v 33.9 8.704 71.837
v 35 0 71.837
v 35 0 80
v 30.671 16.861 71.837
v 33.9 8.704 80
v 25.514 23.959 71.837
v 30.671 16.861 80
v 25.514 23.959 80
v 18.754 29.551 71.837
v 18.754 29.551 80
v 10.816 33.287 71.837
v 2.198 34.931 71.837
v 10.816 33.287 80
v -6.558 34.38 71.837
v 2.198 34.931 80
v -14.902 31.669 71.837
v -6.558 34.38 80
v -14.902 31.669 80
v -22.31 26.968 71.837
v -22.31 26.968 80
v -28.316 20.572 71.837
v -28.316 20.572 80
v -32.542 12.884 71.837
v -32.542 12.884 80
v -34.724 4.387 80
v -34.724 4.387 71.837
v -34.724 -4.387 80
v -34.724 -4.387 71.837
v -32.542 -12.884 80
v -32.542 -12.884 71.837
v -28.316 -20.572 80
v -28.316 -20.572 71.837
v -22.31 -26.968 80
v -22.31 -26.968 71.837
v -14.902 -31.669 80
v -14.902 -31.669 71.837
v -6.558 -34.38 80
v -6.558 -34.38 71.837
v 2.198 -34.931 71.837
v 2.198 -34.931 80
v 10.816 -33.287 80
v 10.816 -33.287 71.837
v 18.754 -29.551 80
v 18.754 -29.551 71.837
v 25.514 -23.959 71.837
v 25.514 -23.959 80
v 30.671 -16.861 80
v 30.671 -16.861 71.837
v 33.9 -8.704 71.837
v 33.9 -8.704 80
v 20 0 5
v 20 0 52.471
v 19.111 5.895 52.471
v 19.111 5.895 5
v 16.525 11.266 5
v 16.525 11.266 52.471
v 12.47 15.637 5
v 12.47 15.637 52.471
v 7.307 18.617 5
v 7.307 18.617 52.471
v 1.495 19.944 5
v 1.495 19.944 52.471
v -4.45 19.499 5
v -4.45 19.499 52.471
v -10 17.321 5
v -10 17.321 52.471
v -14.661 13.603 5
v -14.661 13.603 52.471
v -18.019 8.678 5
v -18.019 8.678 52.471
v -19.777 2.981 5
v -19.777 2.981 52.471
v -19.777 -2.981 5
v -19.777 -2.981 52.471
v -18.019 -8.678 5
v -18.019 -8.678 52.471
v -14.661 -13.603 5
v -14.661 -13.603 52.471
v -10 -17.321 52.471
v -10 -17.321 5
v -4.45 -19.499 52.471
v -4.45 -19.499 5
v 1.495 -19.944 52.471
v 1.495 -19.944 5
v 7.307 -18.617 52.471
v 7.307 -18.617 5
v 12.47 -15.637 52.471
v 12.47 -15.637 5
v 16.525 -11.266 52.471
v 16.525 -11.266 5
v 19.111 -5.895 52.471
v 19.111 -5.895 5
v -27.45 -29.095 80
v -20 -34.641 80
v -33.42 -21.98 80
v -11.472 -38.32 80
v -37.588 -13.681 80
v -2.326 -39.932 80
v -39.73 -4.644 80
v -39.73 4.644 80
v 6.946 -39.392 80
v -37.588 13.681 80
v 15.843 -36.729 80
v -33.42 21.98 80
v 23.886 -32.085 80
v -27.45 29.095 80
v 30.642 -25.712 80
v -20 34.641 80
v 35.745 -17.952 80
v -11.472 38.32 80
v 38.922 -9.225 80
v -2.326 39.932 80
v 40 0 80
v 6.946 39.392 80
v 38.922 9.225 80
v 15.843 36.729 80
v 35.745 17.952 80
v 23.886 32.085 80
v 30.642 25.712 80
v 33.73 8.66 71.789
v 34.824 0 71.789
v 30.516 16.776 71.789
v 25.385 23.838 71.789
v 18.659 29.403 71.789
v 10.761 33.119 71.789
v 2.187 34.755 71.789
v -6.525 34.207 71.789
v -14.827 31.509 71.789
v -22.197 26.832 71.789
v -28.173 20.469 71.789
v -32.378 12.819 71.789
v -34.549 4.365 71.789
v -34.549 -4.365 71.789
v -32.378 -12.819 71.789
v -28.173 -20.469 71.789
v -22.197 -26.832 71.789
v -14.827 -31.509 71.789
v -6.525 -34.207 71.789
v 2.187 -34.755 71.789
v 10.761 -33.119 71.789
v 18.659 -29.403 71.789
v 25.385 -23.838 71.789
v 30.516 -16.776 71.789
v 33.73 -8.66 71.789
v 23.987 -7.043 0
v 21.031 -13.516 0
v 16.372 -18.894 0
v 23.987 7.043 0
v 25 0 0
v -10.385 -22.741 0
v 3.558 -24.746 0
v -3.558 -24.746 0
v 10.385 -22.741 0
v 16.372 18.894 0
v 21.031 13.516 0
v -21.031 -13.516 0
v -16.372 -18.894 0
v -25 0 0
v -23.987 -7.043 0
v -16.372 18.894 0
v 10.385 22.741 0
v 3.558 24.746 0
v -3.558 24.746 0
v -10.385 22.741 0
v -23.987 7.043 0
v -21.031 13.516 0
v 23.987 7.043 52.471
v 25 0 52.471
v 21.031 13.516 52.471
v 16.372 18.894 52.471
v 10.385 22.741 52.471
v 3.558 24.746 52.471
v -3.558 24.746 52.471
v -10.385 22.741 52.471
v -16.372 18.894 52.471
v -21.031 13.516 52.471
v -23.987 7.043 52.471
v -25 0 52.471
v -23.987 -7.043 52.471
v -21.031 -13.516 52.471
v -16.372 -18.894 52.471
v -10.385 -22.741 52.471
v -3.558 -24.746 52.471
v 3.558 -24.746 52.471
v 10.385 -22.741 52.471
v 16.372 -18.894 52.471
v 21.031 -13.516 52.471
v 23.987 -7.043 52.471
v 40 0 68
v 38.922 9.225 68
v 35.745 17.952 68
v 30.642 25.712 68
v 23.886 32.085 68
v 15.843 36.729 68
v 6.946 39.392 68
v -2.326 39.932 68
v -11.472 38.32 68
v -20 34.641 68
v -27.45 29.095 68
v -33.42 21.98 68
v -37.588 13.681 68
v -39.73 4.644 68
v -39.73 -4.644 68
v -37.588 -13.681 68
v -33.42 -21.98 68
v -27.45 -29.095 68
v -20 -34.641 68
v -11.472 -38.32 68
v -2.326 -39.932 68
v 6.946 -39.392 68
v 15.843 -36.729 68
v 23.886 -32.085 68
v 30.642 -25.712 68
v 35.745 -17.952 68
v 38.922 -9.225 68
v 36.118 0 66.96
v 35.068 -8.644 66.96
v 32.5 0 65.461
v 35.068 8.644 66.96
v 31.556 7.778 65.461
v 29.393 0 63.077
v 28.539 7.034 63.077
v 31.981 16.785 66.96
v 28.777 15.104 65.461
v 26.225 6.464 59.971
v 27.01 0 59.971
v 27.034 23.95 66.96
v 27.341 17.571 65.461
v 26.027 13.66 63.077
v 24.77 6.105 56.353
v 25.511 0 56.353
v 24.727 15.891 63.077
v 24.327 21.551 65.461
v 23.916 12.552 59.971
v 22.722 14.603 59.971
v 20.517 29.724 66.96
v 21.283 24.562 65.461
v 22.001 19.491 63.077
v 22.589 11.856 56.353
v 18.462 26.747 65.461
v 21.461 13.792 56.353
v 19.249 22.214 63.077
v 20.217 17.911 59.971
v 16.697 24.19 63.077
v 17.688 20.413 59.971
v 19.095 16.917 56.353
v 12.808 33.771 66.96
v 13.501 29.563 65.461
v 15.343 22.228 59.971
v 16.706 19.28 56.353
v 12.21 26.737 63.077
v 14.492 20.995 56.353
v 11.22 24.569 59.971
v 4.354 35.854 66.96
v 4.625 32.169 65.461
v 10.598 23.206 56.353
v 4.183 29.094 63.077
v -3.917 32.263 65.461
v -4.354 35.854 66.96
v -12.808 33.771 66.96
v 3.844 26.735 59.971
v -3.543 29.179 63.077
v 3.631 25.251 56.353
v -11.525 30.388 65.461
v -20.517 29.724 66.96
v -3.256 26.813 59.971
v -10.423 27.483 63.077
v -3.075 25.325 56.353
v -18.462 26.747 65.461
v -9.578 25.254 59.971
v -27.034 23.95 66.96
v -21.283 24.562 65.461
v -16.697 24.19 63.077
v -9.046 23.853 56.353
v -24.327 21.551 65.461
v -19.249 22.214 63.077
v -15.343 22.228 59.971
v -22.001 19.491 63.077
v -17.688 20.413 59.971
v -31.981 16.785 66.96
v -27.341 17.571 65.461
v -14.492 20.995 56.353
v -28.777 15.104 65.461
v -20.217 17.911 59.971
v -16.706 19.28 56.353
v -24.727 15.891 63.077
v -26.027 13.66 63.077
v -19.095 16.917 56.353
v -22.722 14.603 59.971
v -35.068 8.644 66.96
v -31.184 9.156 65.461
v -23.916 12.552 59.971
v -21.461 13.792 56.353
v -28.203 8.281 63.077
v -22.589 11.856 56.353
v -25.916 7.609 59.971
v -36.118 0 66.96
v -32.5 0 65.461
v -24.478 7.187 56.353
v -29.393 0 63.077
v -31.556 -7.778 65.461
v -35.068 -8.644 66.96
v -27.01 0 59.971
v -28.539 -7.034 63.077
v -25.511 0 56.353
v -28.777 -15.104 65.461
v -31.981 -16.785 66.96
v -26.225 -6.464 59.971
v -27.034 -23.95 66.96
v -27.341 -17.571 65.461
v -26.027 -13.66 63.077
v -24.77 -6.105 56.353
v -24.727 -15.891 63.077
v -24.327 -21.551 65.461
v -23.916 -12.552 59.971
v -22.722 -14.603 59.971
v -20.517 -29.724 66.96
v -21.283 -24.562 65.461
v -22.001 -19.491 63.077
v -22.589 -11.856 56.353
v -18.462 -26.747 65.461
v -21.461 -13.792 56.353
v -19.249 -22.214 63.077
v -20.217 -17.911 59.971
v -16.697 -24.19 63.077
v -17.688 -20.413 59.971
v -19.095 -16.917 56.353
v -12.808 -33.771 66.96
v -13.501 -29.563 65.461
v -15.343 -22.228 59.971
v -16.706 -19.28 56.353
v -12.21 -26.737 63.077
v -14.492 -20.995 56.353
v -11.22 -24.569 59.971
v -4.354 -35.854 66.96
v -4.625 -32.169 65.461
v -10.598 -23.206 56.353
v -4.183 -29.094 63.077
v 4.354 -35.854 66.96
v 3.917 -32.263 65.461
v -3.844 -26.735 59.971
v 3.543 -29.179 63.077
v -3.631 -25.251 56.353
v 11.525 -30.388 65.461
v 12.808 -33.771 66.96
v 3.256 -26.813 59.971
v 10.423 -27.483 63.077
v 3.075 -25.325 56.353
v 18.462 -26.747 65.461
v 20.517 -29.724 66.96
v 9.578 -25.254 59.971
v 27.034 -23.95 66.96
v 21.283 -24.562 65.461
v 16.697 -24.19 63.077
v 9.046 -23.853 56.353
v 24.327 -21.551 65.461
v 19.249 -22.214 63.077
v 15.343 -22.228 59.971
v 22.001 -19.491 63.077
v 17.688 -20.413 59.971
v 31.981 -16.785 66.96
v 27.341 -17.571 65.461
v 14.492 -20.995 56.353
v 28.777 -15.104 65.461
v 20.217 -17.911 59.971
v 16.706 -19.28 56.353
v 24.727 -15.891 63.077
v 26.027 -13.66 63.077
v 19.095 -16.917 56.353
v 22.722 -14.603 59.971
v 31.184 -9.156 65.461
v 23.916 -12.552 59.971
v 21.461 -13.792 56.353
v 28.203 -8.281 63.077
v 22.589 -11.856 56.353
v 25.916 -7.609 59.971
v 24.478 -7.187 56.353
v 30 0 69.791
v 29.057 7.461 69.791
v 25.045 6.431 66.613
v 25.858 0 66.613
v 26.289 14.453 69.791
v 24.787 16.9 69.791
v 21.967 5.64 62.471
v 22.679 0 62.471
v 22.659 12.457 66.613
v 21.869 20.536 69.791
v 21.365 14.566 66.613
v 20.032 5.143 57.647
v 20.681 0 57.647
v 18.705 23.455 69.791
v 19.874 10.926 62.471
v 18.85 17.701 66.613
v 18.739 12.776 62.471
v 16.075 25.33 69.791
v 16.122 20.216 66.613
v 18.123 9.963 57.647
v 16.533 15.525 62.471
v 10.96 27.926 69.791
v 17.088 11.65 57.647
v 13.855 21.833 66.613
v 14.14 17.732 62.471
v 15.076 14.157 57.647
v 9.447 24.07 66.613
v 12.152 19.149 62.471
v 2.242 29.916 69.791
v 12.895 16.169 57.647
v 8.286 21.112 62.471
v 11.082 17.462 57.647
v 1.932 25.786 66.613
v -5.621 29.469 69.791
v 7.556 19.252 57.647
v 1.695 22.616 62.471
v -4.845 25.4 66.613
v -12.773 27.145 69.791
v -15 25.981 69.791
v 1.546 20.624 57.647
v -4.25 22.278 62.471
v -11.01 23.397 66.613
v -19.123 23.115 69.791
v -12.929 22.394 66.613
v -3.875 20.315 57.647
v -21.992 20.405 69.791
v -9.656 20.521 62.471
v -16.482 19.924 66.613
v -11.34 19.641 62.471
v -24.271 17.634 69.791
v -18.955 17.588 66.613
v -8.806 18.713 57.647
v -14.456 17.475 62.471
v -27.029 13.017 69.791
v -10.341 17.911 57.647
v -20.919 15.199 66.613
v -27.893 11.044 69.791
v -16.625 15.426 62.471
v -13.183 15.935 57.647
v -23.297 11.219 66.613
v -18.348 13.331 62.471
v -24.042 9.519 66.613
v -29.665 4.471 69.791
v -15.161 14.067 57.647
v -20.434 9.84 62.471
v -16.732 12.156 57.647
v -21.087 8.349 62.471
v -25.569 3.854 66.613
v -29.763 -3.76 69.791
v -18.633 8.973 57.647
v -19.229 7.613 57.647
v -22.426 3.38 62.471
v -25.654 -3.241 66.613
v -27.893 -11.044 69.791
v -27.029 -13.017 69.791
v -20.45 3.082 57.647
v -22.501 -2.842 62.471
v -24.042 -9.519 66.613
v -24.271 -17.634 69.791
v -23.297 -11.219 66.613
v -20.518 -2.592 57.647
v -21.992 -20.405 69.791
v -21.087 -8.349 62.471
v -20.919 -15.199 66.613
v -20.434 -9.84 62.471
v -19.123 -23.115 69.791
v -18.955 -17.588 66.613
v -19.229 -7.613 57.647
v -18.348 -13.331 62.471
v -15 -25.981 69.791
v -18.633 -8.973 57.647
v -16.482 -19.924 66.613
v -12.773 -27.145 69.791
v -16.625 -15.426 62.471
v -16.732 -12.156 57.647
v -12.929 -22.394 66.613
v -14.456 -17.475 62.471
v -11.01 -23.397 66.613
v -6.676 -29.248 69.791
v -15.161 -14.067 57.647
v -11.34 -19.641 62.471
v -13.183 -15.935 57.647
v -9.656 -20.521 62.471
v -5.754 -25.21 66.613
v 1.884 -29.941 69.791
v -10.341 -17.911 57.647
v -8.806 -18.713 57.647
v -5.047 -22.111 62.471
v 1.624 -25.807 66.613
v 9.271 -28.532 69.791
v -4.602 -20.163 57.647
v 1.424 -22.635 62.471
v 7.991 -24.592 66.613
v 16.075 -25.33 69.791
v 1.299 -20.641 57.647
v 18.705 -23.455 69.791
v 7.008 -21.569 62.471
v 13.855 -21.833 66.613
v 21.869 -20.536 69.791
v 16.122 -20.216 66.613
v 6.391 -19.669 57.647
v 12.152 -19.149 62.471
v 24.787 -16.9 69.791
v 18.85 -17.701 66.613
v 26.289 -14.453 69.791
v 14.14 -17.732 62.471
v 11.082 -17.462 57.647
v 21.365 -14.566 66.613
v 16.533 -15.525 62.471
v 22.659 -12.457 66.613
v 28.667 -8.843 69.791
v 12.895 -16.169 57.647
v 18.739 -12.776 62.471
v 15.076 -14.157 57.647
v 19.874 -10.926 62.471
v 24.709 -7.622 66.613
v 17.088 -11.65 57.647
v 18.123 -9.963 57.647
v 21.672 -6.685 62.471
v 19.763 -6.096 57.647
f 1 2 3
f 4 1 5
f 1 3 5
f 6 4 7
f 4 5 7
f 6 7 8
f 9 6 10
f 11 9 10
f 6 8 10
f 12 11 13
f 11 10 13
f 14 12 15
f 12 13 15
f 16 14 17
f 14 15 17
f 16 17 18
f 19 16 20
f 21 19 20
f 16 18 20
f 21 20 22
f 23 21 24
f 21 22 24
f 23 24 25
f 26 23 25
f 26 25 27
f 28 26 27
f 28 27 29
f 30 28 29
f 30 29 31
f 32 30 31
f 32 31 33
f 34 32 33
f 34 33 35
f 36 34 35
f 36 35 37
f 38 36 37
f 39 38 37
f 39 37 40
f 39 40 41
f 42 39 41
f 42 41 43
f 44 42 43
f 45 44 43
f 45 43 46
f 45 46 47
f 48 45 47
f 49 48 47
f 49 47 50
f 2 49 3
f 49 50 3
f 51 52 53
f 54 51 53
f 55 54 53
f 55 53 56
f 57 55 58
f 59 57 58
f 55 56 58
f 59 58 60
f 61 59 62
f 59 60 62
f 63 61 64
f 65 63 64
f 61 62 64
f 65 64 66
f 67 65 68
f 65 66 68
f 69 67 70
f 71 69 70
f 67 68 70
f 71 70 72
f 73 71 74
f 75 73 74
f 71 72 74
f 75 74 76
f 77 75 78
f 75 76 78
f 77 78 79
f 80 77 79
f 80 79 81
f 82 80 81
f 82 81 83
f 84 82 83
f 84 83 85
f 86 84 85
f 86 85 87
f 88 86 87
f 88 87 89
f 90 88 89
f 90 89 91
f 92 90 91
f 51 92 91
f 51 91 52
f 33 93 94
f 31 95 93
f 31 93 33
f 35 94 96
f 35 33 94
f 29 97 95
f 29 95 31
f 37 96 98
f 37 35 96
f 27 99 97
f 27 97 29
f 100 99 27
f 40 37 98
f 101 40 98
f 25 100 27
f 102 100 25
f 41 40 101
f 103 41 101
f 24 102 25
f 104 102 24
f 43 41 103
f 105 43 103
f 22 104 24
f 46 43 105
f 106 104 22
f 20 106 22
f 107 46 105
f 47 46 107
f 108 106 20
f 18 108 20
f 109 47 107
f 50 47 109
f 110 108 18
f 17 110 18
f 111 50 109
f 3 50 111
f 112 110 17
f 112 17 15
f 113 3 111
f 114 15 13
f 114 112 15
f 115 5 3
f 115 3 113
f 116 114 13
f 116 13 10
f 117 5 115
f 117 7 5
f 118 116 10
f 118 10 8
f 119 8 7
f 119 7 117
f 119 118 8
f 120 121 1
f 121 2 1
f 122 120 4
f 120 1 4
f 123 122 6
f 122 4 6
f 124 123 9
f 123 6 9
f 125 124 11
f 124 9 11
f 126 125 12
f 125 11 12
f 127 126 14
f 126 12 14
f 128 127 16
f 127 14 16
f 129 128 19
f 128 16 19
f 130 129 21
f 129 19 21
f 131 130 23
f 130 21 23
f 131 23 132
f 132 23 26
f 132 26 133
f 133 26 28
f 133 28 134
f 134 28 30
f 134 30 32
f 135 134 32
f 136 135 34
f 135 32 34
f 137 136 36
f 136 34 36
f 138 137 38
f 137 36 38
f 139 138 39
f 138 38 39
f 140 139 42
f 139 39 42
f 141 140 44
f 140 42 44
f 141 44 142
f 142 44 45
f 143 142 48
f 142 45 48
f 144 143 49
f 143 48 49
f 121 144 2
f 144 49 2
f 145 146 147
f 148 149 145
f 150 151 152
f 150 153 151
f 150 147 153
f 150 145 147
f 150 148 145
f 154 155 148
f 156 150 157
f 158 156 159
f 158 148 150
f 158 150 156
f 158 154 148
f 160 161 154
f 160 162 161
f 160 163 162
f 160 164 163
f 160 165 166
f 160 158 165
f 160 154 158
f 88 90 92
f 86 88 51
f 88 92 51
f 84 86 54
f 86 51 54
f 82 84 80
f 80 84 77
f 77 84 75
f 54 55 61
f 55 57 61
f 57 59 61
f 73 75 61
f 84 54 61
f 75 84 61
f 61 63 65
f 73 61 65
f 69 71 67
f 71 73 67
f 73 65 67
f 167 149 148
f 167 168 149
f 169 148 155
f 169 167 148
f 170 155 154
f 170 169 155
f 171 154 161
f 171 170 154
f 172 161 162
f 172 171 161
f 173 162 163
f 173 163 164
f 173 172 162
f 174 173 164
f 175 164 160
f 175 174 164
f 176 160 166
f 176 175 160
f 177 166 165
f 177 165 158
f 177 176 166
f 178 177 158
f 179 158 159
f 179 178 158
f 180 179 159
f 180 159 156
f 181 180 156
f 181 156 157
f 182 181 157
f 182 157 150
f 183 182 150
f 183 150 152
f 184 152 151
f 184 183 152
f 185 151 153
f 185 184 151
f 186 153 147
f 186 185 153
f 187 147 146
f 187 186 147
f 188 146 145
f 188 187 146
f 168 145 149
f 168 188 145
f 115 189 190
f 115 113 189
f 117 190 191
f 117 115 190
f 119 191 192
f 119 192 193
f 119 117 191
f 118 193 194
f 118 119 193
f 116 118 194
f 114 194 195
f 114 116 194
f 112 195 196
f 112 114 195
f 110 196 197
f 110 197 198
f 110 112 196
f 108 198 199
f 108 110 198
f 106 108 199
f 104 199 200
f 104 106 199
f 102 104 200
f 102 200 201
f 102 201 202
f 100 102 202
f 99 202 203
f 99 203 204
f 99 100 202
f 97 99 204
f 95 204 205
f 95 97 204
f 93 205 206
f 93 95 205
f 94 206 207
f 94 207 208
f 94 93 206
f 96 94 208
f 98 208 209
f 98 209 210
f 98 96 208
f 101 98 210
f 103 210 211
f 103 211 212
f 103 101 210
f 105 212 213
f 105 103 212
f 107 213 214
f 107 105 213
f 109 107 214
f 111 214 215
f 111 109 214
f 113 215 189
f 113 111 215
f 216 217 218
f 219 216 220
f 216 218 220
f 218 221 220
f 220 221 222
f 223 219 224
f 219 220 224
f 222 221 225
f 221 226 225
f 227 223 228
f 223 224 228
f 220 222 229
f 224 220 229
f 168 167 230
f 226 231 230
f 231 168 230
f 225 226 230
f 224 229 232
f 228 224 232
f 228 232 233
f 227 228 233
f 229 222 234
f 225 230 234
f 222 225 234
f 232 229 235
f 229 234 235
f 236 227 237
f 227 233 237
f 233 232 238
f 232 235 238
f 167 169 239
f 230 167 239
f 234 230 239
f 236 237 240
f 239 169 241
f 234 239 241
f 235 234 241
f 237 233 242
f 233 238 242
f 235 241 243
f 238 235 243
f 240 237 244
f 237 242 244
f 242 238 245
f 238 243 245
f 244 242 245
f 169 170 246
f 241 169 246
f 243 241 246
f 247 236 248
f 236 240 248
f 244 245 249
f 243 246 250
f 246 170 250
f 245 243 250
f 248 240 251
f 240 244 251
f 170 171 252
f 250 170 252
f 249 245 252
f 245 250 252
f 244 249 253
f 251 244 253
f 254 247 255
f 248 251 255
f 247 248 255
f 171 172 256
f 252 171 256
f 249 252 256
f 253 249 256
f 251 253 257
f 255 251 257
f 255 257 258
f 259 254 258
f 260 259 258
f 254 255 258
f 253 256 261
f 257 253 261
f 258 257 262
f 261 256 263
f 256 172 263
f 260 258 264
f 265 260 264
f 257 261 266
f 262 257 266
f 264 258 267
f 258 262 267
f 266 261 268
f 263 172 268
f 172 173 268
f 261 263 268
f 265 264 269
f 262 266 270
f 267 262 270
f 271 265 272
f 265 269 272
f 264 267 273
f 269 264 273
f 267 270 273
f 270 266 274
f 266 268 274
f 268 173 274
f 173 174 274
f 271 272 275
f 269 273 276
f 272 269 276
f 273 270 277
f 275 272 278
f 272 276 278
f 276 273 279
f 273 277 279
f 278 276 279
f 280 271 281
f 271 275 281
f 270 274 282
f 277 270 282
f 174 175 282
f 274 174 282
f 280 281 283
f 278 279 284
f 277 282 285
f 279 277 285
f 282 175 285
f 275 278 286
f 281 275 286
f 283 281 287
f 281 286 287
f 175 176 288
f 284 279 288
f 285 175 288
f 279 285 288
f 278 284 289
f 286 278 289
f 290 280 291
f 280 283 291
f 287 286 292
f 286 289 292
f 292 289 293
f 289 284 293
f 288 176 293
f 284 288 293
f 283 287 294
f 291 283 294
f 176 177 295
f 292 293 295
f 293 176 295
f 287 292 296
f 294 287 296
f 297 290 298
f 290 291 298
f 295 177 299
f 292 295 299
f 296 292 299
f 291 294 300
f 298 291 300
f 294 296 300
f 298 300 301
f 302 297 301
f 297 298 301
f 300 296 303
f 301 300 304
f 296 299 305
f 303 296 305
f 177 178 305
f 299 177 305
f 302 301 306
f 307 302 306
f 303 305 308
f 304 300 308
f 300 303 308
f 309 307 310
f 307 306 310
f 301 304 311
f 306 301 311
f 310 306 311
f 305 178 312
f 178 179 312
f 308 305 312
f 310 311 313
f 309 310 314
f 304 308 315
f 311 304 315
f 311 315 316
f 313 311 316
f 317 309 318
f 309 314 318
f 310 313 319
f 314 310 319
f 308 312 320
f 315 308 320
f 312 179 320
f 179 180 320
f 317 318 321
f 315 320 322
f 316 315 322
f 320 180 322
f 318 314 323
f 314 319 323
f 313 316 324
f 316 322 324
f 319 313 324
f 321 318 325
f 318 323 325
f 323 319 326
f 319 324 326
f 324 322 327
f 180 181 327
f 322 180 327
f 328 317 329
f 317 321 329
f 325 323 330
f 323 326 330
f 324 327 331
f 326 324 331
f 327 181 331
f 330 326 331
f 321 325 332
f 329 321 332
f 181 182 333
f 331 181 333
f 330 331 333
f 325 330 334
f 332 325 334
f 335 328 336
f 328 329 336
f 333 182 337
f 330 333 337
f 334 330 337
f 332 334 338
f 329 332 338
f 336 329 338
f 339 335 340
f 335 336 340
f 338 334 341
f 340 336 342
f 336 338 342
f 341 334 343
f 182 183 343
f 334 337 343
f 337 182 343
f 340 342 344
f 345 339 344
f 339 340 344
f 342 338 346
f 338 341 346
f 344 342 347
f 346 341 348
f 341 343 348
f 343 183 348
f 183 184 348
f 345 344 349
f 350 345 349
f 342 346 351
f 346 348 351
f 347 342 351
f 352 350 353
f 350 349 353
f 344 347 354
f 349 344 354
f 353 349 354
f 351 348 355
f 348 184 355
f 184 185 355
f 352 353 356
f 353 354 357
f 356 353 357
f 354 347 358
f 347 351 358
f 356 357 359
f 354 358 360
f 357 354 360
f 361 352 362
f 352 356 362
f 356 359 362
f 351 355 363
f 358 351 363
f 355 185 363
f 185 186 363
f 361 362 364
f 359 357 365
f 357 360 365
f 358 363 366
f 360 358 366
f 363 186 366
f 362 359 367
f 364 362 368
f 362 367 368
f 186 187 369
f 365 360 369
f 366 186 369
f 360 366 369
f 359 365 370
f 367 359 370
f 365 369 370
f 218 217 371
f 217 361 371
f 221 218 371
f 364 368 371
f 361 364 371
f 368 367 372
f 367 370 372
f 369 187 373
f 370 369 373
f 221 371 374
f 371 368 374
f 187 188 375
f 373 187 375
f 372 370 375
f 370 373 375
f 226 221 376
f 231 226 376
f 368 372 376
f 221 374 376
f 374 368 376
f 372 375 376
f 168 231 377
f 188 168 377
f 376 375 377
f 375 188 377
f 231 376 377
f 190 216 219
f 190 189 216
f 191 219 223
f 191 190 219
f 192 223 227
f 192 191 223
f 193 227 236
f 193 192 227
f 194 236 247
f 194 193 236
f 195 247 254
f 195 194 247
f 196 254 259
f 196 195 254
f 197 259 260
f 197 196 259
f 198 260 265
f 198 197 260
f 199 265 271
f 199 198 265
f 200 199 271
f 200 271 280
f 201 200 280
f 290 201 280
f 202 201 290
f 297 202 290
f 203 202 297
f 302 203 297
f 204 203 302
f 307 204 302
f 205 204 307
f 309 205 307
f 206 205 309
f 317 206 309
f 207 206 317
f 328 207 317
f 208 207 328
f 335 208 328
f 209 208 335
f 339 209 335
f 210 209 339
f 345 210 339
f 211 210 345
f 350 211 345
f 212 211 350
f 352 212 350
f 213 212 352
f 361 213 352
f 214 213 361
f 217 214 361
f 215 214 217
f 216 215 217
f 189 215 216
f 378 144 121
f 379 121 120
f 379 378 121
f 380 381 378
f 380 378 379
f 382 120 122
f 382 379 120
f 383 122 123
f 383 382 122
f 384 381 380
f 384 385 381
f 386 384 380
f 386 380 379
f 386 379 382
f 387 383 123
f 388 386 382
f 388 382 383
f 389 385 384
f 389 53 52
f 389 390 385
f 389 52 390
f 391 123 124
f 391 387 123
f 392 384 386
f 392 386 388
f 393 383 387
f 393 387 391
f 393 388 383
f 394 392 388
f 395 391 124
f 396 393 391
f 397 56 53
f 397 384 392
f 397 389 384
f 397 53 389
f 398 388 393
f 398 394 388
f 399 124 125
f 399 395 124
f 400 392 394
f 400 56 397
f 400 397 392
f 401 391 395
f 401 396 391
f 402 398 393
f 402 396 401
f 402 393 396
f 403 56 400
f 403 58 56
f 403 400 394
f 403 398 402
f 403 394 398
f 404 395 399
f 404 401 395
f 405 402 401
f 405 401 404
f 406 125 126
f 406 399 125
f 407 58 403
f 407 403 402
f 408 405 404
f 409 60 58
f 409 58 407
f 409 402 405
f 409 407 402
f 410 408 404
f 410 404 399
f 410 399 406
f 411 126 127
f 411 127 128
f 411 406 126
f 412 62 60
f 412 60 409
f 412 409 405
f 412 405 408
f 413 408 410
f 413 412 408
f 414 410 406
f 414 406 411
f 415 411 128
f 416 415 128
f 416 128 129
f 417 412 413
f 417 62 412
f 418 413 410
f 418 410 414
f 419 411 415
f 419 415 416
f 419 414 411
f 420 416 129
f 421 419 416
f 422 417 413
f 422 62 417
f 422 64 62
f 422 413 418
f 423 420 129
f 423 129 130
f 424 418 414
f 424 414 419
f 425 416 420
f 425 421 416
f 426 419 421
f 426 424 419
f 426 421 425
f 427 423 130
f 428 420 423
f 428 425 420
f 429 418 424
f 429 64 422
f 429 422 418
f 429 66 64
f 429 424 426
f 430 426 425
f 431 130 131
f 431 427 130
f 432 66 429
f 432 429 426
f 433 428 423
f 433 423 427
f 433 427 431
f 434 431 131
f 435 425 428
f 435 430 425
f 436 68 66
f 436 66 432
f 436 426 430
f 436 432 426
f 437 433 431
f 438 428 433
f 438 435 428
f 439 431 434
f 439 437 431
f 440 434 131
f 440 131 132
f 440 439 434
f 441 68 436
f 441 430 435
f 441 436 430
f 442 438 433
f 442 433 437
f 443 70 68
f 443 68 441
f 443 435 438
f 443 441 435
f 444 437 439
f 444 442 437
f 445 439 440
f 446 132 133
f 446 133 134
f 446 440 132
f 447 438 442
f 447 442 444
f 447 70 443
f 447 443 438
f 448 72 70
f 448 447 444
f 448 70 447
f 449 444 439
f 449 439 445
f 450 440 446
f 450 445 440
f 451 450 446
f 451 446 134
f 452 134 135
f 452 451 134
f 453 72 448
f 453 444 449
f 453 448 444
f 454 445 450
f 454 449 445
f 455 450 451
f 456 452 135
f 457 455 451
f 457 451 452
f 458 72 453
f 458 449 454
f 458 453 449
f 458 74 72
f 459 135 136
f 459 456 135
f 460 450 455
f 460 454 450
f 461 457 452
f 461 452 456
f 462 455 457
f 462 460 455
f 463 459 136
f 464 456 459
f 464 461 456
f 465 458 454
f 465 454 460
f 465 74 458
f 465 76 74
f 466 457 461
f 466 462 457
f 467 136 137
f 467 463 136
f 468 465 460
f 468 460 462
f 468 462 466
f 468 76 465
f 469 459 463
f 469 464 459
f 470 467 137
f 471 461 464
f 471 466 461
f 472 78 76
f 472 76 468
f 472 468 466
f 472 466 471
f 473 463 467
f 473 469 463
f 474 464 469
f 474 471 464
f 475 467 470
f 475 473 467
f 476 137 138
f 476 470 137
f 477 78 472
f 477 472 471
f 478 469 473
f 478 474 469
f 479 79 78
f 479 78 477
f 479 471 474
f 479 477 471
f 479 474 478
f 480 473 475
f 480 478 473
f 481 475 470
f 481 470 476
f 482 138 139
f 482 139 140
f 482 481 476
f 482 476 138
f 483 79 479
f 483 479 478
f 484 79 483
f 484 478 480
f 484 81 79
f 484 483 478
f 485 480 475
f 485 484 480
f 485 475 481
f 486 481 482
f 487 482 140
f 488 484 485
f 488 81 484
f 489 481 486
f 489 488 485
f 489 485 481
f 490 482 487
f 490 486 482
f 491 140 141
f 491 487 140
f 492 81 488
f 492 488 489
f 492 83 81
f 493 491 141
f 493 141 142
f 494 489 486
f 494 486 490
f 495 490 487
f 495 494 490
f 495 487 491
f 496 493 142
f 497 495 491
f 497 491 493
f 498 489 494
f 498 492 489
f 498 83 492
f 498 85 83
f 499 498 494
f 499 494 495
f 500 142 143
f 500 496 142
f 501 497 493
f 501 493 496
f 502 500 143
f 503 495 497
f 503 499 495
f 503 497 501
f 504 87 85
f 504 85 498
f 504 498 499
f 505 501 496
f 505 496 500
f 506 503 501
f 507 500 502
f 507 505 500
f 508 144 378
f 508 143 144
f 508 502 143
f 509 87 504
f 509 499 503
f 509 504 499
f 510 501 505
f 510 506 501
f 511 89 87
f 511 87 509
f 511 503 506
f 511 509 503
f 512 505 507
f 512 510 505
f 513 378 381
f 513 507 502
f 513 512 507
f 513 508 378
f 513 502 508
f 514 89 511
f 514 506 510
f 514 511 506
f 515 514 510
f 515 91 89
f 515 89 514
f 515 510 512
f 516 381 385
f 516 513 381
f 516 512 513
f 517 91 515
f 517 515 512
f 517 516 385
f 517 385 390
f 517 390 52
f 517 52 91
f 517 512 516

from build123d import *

# Parameters (mm, degrees)
THICKNESS_T = -5


with BuildPart() as part:
    # Sketch → Revolution (revolve)
    with BuildSketch(Plane.XZ):
        with BuildLine():
            Line((0, 0), (25, 0))
            Line((25, 0), (25, 52.470857))
            ThreePointArc((36.117714, 66.959745), (28.0997, 61.602279), (25, 52.470857))
            Line((36.117714, 66.959745), (40, 68))
            Line((40, 68), (40, 80))
            Line((40, 80), (0, 80))
            Line((0, 80), (0, 0))
        make_face()
    revolve(axis=Axis((0, 0, 0), (0, 0, 1)))

    # Thickness
    thickness_openings = [part.faces().sort_by_distance(p)[0] for p in [
        (0, 0, 80),
    ]]
    offset(amount=THICKNESS_T, openings=thickness_openings)


solid = part.part
